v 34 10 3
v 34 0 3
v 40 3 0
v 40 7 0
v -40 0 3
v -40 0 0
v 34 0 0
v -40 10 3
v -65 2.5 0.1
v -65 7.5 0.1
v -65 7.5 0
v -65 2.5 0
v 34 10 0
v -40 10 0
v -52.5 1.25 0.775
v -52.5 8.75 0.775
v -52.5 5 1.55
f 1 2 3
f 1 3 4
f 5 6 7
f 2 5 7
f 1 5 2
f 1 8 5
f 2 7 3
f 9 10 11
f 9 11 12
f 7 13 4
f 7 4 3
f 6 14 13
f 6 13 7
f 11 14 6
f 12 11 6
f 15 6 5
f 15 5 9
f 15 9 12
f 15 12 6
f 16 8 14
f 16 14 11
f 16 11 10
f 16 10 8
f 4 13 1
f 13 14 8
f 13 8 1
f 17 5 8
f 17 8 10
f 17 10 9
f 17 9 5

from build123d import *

# Parameters (mm, degrees)
F0_W      = 80
F0_H      = 10
F1_DEPTH  = 3
F1_FACE_W = 10
F1_FACE_H = 3
F3_W      = 5
F3_H      = 0.1
F5_SIZE2  = 5.99999
F5_SIZE   = 2.99999


# Not quite as in the source:
# - a fillet or chamfer is up to 0.001 mm smaller than in the source, because OpenCascade refuses the exact size


with BuildPart() as f1:
    # F0 (on Top) → F1 (new body)
    with BuildSketch(Plane.XY):
        with Locations((0, 5)):
            Rectangle(F0_W, F0_H)
    extrude(amount=F1_DEPTH)

    # F1_face (on face) → F4 section 0
    with BuildSketch(Plane(origin=(-40, 5, 1.5), x_dir=(0, -1, 0), z_dir=(-1, 0, 0))):
        Rectangle(F1_FACE_W, F1_FACE_H)
    # F3 (on plane+point) → F4 section 1
    with BuildSketch(Plane.YZ.offset(-65)):
        with Locations((5, 0.05)):
            Rectangle(F3_W, F3_H)
    loft()

    # F5 (size 3 and 6 in the source; OpenCascade refuses exactly that, so slightly less here)
    f5_edges = [f1.edges().sort_by_distance(p)[0] for p in [
        (40, 5, 3),
        (40, 0, 1.5),
        (40, 10, 1.5),
    ]]
    f5_side = f1.faces().sort_by_distance((40, 5, 1.5))[0]
    chamfer(f5_edges, length=F5_SIZE, length2=F5_SIZE2, reference=f5_side)


solid = f1.part
